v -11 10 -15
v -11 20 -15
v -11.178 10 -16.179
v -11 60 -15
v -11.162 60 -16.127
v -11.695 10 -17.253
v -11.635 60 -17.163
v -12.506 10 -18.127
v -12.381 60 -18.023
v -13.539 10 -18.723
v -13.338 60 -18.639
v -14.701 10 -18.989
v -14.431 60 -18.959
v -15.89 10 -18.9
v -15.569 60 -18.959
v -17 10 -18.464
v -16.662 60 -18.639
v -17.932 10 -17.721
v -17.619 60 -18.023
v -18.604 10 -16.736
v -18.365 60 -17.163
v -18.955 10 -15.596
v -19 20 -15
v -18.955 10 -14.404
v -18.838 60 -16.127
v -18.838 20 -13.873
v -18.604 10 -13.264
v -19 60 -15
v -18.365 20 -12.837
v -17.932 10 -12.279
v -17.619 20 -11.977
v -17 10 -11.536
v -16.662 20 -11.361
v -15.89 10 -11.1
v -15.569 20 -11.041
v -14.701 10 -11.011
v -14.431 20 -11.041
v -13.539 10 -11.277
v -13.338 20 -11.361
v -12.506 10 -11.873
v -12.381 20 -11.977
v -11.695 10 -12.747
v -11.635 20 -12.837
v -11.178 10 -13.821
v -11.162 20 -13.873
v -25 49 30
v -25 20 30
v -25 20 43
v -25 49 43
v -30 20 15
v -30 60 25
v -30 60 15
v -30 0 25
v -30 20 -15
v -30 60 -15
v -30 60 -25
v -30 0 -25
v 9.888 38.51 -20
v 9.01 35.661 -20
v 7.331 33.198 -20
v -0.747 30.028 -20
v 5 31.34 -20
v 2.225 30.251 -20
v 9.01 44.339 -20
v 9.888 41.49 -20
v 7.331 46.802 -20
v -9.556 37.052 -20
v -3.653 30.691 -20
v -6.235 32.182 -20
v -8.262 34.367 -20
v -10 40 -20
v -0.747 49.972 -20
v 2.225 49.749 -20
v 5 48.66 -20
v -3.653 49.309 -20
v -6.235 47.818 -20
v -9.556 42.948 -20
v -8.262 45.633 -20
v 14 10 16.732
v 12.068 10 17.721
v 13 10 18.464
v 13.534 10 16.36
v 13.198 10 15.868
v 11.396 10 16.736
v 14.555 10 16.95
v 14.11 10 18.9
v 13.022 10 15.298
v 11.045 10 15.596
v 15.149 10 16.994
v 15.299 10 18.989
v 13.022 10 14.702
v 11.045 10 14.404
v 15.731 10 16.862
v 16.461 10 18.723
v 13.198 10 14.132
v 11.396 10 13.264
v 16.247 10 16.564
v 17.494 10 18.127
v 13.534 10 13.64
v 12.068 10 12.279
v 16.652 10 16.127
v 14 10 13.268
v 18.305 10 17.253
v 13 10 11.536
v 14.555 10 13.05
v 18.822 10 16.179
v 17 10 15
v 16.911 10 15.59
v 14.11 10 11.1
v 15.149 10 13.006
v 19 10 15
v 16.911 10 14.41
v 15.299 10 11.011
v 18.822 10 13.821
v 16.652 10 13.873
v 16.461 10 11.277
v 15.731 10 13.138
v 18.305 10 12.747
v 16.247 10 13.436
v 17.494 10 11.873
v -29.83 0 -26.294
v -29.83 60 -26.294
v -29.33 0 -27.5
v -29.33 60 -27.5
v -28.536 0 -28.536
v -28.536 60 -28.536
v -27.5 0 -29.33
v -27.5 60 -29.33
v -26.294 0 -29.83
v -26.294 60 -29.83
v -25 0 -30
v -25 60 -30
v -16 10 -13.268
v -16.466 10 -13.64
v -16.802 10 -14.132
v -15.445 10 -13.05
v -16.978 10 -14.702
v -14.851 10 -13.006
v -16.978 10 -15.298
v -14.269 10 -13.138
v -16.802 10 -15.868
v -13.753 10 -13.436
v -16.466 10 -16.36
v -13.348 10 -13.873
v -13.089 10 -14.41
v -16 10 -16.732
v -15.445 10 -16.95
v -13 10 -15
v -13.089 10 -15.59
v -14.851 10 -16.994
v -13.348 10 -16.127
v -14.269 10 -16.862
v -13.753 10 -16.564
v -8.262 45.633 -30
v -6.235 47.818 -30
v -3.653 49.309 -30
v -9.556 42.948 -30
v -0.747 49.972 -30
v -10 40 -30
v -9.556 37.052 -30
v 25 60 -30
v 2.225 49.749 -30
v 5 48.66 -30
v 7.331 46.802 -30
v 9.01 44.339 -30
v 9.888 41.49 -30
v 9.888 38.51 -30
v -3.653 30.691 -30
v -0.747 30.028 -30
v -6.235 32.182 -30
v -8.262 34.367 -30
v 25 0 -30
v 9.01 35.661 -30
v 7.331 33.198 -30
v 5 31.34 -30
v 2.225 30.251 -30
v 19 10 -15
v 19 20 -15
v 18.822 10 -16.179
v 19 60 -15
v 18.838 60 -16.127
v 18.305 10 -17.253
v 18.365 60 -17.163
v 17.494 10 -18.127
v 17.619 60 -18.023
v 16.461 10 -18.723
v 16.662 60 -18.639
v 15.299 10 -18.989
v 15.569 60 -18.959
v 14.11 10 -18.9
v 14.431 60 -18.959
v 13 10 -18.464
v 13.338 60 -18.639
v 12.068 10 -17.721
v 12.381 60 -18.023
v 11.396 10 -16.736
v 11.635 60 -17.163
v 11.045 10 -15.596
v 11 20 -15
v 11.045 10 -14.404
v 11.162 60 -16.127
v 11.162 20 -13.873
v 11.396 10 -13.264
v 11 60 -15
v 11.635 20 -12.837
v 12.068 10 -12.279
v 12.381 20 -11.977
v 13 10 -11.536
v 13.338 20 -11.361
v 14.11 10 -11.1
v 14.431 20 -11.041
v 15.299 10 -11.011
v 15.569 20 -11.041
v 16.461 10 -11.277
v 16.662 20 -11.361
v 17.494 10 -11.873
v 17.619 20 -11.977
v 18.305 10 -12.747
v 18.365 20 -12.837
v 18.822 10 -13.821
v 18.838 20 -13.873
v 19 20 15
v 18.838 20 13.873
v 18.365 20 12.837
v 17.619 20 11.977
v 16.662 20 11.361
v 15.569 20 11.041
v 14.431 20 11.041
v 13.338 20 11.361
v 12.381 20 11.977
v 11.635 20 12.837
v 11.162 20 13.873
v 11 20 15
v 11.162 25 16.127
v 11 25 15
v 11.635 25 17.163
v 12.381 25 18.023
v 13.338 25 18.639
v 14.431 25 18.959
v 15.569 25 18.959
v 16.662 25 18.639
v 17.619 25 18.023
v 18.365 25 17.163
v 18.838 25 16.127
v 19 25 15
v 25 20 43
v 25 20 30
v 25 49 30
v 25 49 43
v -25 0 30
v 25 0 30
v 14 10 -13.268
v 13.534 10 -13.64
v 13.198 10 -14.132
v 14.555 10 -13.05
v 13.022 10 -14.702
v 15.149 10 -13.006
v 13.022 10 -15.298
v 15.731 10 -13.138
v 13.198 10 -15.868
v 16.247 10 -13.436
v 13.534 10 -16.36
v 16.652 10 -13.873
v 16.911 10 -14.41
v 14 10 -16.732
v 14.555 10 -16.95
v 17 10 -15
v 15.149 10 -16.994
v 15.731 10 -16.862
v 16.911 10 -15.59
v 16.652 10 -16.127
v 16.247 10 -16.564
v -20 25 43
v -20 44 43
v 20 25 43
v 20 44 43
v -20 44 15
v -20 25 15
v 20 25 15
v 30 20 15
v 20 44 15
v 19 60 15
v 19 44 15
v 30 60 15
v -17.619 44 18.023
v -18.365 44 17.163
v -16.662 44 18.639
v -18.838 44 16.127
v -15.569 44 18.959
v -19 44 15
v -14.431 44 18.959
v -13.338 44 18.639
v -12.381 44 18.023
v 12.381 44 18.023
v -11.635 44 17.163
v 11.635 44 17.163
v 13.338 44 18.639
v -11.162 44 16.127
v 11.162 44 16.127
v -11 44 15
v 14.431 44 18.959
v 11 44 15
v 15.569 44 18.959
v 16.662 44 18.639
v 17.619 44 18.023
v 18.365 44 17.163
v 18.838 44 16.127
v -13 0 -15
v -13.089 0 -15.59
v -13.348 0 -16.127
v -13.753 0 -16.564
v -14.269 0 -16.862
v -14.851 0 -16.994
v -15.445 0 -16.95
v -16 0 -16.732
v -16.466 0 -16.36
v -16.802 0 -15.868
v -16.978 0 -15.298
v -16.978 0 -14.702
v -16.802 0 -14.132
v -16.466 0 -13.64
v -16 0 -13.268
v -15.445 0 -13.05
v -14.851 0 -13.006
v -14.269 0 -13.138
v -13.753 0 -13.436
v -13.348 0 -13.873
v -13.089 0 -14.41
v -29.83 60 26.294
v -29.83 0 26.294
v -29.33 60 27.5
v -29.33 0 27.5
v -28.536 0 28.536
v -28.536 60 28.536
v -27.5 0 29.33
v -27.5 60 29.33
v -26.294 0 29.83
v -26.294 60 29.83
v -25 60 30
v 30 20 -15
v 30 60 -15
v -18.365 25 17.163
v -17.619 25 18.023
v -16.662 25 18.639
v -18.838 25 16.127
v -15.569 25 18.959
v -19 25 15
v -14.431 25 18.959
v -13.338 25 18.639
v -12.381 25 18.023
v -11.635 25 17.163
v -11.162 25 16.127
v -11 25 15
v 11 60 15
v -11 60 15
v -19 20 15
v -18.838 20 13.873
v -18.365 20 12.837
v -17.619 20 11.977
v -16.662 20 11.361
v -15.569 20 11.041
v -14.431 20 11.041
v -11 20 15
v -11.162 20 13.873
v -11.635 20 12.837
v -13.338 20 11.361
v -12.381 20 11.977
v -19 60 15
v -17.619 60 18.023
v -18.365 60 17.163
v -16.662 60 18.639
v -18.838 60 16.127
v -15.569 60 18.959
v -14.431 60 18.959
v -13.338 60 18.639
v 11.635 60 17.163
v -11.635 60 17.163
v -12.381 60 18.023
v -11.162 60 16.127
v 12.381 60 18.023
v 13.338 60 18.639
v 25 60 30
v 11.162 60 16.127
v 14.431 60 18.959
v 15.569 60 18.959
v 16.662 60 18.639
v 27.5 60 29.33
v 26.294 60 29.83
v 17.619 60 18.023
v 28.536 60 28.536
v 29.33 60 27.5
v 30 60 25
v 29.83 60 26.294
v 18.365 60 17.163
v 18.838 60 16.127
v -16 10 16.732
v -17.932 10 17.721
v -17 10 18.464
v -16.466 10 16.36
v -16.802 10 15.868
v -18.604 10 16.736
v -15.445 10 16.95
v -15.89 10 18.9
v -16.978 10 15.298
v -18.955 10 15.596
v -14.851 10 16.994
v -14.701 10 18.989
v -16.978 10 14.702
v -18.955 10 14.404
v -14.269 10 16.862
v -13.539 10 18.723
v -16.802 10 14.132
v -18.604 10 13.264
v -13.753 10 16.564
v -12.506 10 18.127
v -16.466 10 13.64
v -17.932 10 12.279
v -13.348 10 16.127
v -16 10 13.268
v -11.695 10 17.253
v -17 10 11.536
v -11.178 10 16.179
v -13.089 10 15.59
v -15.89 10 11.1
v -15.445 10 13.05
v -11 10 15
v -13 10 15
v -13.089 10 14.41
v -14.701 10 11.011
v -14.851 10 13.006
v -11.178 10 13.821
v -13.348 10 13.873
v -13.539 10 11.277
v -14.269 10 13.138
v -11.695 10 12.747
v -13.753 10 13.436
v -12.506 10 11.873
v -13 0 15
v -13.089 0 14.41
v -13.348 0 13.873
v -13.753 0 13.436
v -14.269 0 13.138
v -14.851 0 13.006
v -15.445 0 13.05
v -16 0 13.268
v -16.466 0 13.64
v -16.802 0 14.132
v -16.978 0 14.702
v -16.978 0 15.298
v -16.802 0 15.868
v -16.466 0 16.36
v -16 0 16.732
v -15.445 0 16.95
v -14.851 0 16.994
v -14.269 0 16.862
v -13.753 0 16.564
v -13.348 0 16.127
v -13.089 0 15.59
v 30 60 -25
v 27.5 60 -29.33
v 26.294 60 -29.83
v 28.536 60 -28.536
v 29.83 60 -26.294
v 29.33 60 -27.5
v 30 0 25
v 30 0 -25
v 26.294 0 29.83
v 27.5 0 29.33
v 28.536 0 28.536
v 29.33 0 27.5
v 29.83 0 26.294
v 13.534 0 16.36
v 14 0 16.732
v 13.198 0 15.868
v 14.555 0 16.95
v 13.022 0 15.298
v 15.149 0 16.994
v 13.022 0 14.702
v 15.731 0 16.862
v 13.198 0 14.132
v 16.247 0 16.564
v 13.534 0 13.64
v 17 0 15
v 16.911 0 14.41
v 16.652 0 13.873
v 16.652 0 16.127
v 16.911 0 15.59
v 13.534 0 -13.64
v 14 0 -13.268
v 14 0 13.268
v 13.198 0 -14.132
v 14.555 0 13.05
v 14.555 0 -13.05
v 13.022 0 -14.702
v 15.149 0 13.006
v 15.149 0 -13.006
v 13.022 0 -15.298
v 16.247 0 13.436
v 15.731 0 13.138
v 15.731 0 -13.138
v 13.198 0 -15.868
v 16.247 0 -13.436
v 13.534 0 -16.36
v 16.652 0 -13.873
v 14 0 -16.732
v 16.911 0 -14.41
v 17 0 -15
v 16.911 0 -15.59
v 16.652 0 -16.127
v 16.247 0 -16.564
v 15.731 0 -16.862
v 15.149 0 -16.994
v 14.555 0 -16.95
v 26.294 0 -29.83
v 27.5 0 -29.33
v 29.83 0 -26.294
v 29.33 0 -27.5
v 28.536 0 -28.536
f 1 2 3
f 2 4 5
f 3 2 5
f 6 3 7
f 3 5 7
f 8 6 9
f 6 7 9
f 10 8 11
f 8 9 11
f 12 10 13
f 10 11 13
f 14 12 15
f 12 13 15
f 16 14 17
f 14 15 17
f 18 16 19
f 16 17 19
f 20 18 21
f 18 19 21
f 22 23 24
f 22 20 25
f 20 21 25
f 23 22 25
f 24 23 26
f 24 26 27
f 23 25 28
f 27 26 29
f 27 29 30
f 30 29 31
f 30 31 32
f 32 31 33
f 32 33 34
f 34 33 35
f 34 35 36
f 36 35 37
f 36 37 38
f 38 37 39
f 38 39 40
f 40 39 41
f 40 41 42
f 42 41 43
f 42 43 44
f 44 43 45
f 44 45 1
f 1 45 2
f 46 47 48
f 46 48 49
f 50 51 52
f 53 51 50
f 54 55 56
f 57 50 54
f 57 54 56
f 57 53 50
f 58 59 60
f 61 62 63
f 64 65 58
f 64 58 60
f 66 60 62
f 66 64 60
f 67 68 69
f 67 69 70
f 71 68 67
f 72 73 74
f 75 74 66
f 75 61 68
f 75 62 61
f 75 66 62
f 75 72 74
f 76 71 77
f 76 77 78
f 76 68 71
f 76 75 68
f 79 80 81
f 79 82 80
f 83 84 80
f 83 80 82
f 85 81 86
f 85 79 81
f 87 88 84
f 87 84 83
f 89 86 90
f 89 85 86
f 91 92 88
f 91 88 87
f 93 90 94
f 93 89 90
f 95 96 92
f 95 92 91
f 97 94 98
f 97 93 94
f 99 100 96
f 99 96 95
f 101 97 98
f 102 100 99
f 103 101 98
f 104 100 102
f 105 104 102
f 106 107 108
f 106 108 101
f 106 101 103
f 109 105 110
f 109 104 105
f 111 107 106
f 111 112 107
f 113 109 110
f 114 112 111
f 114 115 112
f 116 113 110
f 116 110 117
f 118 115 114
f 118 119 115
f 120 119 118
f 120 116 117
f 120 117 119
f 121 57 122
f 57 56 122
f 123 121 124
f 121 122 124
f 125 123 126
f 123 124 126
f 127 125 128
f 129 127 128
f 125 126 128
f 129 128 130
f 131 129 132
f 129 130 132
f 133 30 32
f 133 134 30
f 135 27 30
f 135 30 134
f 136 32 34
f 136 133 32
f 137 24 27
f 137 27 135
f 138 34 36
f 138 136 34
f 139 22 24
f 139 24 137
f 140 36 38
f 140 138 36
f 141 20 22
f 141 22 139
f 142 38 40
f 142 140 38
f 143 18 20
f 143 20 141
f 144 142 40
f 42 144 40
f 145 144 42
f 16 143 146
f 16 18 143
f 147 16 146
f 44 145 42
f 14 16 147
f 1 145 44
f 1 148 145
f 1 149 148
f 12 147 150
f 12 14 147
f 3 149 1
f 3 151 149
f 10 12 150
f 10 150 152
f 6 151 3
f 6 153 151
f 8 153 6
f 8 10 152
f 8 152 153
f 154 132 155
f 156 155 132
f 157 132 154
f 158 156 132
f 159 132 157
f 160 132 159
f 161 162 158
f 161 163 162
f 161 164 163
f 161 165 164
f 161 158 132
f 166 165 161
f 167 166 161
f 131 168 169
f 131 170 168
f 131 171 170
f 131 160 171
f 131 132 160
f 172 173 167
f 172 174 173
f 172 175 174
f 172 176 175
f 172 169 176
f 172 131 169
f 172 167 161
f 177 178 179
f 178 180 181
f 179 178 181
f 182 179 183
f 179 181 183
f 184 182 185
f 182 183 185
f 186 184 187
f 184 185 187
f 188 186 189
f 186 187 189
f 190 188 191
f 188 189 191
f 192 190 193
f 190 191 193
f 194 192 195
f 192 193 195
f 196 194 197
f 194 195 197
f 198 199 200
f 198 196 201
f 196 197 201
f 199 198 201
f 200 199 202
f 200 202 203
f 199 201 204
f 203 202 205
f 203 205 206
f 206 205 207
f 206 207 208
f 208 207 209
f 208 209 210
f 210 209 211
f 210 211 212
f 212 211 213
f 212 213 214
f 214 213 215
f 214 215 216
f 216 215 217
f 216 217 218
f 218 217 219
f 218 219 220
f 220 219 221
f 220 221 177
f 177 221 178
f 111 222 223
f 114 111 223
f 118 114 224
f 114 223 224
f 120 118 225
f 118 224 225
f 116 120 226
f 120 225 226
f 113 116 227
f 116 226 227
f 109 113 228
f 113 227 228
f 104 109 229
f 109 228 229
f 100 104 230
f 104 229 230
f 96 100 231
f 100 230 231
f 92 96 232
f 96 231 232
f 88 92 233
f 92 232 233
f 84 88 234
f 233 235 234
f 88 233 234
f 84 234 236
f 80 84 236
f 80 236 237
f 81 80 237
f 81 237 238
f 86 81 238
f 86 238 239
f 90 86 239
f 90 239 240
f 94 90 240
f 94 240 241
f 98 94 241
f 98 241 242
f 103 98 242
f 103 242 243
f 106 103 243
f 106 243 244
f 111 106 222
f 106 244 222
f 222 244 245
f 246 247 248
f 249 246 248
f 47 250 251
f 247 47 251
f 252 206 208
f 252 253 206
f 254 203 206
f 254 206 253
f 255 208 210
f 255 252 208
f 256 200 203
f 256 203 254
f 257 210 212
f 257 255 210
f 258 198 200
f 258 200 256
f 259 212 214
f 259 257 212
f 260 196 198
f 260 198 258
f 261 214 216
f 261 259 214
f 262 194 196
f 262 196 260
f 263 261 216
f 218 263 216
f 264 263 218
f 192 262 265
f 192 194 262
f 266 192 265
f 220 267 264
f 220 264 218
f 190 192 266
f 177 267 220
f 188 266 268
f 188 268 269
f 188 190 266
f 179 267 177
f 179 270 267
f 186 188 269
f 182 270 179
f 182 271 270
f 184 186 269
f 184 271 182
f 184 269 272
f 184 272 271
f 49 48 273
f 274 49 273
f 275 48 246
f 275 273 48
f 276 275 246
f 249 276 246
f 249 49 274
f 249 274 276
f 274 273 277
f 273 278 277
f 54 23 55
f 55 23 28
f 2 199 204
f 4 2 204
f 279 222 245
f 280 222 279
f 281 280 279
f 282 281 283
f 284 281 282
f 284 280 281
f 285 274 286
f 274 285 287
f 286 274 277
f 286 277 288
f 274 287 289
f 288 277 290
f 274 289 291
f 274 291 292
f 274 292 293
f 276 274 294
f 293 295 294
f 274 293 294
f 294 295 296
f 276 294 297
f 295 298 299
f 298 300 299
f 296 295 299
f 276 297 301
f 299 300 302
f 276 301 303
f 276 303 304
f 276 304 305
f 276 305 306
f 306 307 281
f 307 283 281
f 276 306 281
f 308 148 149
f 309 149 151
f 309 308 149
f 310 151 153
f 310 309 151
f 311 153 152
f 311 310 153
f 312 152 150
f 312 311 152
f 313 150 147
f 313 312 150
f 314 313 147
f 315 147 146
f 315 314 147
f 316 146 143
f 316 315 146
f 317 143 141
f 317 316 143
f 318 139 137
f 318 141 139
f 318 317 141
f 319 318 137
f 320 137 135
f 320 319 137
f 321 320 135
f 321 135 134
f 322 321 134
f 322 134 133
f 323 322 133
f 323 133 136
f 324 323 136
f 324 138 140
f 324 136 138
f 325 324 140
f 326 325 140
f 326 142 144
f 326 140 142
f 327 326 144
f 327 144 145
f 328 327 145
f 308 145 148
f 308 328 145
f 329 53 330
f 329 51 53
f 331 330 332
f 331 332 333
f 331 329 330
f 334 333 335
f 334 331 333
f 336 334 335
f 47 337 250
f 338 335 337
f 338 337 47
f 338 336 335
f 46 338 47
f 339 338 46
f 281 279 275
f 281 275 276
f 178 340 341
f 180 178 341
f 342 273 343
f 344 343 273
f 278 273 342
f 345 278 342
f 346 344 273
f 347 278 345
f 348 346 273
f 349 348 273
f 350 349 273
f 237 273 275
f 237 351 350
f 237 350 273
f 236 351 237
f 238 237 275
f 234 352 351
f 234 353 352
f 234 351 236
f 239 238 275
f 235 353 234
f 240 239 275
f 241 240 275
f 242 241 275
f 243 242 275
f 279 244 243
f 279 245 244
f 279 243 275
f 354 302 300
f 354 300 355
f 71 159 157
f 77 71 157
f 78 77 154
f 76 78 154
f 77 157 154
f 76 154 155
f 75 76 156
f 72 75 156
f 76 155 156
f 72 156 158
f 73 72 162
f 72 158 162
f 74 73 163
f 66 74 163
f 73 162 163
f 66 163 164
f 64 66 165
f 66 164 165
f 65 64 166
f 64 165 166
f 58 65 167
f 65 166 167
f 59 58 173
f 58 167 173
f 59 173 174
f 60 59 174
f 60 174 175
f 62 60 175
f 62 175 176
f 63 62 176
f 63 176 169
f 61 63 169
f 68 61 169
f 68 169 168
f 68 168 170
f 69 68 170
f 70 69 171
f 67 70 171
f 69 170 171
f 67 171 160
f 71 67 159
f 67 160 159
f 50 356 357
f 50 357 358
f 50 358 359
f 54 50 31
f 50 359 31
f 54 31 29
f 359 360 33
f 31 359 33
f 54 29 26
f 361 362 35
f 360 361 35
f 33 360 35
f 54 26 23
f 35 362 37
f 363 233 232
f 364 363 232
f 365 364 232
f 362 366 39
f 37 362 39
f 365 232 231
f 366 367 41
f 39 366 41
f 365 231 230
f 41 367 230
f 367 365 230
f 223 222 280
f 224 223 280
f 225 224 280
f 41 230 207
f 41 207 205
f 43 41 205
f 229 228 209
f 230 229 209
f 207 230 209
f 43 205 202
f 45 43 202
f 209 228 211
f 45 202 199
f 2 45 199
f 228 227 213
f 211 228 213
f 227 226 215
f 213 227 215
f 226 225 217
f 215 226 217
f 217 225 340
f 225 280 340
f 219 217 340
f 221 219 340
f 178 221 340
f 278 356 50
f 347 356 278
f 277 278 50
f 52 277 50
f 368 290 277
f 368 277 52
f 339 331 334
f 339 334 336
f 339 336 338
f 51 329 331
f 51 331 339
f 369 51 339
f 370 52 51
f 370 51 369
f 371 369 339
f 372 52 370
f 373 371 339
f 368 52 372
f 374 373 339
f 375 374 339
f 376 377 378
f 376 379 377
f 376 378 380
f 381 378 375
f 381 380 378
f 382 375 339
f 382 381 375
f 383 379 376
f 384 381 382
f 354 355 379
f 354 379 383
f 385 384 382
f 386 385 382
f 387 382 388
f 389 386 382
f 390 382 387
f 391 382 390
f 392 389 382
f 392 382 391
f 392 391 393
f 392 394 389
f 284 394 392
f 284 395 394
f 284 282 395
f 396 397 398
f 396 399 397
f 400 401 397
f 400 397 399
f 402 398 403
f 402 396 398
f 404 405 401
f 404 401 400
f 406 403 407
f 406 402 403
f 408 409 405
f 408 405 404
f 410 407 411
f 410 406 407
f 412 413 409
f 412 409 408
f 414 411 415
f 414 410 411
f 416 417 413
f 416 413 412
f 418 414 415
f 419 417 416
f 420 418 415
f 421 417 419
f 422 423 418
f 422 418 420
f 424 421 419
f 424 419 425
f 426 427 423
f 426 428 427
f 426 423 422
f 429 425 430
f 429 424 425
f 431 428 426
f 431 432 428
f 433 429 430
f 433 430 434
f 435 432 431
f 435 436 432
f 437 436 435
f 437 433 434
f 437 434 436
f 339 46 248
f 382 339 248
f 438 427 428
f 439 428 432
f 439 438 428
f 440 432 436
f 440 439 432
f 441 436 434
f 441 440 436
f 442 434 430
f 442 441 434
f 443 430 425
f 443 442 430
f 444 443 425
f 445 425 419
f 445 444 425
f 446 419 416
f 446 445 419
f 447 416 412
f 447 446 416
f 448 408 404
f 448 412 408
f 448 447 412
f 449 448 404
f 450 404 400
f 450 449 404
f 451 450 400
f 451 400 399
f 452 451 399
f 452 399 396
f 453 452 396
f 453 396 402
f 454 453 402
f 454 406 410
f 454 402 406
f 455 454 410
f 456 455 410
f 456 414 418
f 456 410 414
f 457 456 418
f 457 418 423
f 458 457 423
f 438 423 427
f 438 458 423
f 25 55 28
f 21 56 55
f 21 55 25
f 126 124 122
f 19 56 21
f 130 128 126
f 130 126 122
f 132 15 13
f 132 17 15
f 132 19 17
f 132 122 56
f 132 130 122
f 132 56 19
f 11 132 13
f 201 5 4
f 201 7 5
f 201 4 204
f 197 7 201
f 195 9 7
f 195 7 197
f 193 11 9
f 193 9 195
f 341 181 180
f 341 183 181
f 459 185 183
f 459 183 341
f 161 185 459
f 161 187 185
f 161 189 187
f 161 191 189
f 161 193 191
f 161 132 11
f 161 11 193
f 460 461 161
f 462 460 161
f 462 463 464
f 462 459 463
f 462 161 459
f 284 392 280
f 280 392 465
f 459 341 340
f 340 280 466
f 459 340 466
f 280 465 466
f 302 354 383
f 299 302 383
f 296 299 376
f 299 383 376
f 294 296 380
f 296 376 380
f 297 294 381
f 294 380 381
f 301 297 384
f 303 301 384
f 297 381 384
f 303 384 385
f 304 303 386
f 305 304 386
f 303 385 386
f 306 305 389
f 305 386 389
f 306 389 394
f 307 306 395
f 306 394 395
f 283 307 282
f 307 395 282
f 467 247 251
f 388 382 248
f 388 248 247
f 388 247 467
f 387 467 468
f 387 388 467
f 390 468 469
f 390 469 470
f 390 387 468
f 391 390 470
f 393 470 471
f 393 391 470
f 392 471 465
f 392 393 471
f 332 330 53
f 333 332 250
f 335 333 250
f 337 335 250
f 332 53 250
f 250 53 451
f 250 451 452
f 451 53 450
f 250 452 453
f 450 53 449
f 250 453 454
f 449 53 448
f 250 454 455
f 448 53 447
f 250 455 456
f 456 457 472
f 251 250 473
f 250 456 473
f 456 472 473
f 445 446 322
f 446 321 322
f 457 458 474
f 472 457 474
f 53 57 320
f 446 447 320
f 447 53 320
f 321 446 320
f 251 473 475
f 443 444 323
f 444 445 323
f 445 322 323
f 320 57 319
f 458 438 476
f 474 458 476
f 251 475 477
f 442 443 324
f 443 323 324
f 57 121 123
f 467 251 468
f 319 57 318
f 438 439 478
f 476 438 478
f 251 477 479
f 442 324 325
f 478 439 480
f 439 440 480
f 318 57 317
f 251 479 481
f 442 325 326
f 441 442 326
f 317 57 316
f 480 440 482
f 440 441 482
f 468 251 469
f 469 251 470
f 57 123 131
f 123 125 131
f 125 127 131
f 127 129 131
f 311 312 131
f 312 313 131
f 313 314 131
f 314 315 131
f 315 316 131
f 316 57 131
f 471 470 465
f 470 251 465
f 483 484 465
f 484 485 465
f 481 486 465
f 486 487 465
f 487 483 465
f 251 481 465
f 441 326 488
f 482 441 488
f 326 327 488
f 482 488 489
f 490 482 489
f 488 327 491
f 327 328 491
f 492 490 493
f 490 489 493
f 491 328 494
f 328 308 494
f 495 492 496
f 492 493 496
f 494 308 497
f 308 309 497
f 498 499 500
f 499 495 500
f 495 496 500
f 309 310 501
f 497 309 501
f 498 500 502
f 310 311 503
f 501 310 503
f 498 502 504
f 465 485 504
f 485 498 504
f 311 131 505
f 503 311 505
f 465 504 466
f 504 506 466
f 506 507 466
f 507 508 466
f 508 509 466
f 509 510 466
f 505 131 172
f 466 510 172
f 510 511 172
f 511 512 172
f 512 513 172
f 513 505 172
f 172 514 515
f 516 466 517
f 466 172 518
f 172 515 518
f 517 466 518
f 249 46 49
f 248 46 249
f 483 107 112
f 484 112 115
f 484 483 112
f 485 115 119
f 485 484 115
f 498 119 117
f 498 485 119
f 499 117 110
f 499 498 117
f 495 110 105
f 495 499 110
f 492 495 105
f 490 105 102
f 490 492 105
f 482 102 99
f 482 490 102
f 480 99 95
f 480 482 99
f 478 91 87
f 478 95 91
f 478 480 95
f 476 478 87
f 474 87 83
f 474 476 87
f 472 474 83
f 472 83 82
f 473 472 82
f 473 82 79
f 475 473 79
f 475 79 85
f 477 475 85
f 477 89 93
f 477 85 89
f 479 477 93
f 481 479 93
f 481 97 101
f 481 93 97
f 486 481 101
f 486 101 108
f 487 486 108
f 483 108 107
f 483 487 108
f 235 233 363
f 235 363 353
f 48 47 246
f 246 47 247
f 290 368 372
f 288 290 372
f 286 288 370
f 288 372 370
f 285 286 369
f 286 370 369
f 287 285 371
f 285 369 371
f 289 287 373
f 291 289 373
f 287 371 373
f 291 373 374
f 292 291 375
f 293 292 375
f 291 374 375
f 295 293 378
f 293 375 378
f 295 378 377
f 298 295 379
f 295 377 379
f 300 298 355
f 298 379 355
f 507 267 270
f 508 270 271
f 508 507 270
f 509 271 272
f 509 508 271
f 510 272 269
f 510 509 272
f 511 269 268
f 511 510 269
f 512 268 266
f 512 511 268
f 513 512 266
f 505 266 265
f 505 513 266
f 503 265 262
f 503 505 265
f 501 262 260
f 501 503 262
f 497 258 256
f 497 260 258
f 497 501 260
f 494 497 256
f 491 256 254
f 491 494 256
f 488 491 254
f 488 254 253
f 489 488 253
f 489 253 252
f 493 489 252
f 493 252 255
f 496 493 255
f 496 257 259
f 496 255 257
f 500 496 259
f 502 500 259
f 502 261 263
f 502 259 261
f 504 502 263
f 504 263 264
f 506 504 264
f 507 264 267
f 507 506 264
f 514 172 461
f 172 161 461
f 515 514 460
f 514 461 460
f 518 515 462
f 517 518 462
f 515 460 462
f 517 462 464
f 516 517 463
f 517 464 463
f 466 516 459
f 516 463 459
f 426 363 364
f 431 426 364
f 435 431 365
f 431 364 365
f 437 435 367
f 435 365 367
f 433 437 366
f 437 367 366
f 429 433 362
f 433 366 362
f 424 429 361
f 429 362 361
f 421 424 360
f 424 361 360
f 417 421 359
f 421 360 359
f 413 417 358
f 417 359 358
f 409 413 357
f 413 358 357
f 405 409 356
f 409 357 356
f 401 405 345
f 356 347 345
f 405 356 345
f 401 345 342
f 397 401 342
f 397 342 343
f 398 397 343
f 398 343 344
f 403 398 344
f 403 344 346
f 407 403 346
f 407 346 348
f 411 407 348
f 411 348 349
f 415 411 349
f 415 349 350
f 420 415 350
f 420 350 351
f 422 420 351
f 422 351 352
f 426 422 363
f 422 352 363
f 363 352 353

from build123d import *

# Parameters (mm, degrees)
SKETCH1_W           = 60
SKETCH1_H           = 60
SKETCH1_R           = 2
BOSS_EXTRUDE1_DEPTH = 60
SKETCH2_R           = 4
CUT_EXTRUDE1_DEPTH  = 50
FILLET1_R           = 5
SKETCH3_W           = 30
SKETCH3_H           = 40
CUT_EXTRUDE2_DEPTH  = 61
SKETCH4_W           = 40
SKETCH4_H           = 19
CUT_EXTRUDE3_DEPTH  = 30
SKETCH5_W           = 50
SKETCH5_H           = 29
SKETCH5_W_2         = 40
SKETCH5_H_2         = 19
BOSS_EXTRUDE3_DEPTH = 13
SKETCH6_R           = 10
CUT_EXTRUDE4_DEPTH  = 10


with BuildPart() as part:
    # Sketch1 → Boss-Extrude1 (new body)
    with BuildSketch(Plane(origin=(0, 0, 0), x_dir=(1, 0, 0), z_dir=(0, 1, 0))):
        Rectangle(SKETCH1_W, SKETCH1_H)
        with Locations((-15, 15)):
            Circle(SKETCH1_R, mode=Mode.SUBTRACT)
        with Locations((15, 15)):
            Circle(SKETCH1_R, mode=Mode.SUBTRACT)
        with Locations((15, -15)):
            Circle(SKETCH1_R, mode=Mode.SUBTRACT)
        with Locations((-15, -15)):
            Circle(SKETCH1_R, mode=Mode.SUBTRACT)
    extrude(amount=BOSS_EXTRUDE1_DEPTH)

    # Sketch2 → Cut-Extrude1 (cut)
    with BuildSketch(Plane(origin=(0, 60, 0), x_dir=(1, 0, 0), z_dir=(0, 1, 0))):
        with Locations((-15, 15)):
            Circle(SKETCH2_R)
        with Locations((15, 15)):
            Circle(SKETCH2_R)
        with Locations((15, -15)):
            Circle(SKETCH2_R)
        with Locations((-15, -15)):
            Circle(SKETCH2_R)
    extrude(amount=-CUT_EXTRUDE1_DEPTH, mode=Mode.SUBTRACT)

    # Fillet1
    fillet1_edges = [part.edges().sort_by_distance(p)[0] for p in [
        (30, 30, 30),
        (-30, 30, 30),
        (-30, 30, -30),
        (30, 30, -30),
    ]]
    fillet(fillet1_edges, radius=FILLET1_R)

    # Sketch3 → Cut-Extrude2 (cut, through all)
    with BuildSketch(Plane(origin=(30, 0, 0), x_dir=(0, 0, -1), z_dir=(1, 0, 0))):
        with Locations((0, 40)):
            Rectangle(SKETCH3_W, SKETCH3_H)
    extrude(amount=-CUT_EXTRUDE2_DEPTH, mode=Mode.SUBTRACT)

    # Sketch4 → Cut-Extrude3 (cut)
    with BuildSketch(Plane.XY.offset(30)):
        with Locations((0, 34.5)):
            Rectangle(SKETCH4_W, SKETCH4_H)
    extrude(amount=-CUT_EXTRUDE3_DEPTH, mode=Mode.SUBTRACT)

    # Sketch5 → Boss-Extrude3 (add)
    with BuildSketch(Plane.XY.offset(30)):
        with Locations((0, 34.5)):
            Rectangle(SKETCH5_W, SKETCH5_H)
        with Locations((0, 34.5)):
            Rectangle(SKETCH5_W_2, SKETCH5_H_2, mode=Mode.SUBTRACT)
    extrude(amount=BOSS_EXTRUDE3_DEPTH)

    # Sketch6 → Cut-Extrude4 (cut)
    with BuildSketch(Plane(origin=(0, 0, -30), x_dir=(-1, 0, 0), z_dir=(0, 0, -1))):
        with Locations((0, 40)):
            Circle(SKETCH6_R)
    extrude(amount=-CUT_EXTRUDE4_DEPTH, mode=Mode.SUBTRACT)


solid = part.part
